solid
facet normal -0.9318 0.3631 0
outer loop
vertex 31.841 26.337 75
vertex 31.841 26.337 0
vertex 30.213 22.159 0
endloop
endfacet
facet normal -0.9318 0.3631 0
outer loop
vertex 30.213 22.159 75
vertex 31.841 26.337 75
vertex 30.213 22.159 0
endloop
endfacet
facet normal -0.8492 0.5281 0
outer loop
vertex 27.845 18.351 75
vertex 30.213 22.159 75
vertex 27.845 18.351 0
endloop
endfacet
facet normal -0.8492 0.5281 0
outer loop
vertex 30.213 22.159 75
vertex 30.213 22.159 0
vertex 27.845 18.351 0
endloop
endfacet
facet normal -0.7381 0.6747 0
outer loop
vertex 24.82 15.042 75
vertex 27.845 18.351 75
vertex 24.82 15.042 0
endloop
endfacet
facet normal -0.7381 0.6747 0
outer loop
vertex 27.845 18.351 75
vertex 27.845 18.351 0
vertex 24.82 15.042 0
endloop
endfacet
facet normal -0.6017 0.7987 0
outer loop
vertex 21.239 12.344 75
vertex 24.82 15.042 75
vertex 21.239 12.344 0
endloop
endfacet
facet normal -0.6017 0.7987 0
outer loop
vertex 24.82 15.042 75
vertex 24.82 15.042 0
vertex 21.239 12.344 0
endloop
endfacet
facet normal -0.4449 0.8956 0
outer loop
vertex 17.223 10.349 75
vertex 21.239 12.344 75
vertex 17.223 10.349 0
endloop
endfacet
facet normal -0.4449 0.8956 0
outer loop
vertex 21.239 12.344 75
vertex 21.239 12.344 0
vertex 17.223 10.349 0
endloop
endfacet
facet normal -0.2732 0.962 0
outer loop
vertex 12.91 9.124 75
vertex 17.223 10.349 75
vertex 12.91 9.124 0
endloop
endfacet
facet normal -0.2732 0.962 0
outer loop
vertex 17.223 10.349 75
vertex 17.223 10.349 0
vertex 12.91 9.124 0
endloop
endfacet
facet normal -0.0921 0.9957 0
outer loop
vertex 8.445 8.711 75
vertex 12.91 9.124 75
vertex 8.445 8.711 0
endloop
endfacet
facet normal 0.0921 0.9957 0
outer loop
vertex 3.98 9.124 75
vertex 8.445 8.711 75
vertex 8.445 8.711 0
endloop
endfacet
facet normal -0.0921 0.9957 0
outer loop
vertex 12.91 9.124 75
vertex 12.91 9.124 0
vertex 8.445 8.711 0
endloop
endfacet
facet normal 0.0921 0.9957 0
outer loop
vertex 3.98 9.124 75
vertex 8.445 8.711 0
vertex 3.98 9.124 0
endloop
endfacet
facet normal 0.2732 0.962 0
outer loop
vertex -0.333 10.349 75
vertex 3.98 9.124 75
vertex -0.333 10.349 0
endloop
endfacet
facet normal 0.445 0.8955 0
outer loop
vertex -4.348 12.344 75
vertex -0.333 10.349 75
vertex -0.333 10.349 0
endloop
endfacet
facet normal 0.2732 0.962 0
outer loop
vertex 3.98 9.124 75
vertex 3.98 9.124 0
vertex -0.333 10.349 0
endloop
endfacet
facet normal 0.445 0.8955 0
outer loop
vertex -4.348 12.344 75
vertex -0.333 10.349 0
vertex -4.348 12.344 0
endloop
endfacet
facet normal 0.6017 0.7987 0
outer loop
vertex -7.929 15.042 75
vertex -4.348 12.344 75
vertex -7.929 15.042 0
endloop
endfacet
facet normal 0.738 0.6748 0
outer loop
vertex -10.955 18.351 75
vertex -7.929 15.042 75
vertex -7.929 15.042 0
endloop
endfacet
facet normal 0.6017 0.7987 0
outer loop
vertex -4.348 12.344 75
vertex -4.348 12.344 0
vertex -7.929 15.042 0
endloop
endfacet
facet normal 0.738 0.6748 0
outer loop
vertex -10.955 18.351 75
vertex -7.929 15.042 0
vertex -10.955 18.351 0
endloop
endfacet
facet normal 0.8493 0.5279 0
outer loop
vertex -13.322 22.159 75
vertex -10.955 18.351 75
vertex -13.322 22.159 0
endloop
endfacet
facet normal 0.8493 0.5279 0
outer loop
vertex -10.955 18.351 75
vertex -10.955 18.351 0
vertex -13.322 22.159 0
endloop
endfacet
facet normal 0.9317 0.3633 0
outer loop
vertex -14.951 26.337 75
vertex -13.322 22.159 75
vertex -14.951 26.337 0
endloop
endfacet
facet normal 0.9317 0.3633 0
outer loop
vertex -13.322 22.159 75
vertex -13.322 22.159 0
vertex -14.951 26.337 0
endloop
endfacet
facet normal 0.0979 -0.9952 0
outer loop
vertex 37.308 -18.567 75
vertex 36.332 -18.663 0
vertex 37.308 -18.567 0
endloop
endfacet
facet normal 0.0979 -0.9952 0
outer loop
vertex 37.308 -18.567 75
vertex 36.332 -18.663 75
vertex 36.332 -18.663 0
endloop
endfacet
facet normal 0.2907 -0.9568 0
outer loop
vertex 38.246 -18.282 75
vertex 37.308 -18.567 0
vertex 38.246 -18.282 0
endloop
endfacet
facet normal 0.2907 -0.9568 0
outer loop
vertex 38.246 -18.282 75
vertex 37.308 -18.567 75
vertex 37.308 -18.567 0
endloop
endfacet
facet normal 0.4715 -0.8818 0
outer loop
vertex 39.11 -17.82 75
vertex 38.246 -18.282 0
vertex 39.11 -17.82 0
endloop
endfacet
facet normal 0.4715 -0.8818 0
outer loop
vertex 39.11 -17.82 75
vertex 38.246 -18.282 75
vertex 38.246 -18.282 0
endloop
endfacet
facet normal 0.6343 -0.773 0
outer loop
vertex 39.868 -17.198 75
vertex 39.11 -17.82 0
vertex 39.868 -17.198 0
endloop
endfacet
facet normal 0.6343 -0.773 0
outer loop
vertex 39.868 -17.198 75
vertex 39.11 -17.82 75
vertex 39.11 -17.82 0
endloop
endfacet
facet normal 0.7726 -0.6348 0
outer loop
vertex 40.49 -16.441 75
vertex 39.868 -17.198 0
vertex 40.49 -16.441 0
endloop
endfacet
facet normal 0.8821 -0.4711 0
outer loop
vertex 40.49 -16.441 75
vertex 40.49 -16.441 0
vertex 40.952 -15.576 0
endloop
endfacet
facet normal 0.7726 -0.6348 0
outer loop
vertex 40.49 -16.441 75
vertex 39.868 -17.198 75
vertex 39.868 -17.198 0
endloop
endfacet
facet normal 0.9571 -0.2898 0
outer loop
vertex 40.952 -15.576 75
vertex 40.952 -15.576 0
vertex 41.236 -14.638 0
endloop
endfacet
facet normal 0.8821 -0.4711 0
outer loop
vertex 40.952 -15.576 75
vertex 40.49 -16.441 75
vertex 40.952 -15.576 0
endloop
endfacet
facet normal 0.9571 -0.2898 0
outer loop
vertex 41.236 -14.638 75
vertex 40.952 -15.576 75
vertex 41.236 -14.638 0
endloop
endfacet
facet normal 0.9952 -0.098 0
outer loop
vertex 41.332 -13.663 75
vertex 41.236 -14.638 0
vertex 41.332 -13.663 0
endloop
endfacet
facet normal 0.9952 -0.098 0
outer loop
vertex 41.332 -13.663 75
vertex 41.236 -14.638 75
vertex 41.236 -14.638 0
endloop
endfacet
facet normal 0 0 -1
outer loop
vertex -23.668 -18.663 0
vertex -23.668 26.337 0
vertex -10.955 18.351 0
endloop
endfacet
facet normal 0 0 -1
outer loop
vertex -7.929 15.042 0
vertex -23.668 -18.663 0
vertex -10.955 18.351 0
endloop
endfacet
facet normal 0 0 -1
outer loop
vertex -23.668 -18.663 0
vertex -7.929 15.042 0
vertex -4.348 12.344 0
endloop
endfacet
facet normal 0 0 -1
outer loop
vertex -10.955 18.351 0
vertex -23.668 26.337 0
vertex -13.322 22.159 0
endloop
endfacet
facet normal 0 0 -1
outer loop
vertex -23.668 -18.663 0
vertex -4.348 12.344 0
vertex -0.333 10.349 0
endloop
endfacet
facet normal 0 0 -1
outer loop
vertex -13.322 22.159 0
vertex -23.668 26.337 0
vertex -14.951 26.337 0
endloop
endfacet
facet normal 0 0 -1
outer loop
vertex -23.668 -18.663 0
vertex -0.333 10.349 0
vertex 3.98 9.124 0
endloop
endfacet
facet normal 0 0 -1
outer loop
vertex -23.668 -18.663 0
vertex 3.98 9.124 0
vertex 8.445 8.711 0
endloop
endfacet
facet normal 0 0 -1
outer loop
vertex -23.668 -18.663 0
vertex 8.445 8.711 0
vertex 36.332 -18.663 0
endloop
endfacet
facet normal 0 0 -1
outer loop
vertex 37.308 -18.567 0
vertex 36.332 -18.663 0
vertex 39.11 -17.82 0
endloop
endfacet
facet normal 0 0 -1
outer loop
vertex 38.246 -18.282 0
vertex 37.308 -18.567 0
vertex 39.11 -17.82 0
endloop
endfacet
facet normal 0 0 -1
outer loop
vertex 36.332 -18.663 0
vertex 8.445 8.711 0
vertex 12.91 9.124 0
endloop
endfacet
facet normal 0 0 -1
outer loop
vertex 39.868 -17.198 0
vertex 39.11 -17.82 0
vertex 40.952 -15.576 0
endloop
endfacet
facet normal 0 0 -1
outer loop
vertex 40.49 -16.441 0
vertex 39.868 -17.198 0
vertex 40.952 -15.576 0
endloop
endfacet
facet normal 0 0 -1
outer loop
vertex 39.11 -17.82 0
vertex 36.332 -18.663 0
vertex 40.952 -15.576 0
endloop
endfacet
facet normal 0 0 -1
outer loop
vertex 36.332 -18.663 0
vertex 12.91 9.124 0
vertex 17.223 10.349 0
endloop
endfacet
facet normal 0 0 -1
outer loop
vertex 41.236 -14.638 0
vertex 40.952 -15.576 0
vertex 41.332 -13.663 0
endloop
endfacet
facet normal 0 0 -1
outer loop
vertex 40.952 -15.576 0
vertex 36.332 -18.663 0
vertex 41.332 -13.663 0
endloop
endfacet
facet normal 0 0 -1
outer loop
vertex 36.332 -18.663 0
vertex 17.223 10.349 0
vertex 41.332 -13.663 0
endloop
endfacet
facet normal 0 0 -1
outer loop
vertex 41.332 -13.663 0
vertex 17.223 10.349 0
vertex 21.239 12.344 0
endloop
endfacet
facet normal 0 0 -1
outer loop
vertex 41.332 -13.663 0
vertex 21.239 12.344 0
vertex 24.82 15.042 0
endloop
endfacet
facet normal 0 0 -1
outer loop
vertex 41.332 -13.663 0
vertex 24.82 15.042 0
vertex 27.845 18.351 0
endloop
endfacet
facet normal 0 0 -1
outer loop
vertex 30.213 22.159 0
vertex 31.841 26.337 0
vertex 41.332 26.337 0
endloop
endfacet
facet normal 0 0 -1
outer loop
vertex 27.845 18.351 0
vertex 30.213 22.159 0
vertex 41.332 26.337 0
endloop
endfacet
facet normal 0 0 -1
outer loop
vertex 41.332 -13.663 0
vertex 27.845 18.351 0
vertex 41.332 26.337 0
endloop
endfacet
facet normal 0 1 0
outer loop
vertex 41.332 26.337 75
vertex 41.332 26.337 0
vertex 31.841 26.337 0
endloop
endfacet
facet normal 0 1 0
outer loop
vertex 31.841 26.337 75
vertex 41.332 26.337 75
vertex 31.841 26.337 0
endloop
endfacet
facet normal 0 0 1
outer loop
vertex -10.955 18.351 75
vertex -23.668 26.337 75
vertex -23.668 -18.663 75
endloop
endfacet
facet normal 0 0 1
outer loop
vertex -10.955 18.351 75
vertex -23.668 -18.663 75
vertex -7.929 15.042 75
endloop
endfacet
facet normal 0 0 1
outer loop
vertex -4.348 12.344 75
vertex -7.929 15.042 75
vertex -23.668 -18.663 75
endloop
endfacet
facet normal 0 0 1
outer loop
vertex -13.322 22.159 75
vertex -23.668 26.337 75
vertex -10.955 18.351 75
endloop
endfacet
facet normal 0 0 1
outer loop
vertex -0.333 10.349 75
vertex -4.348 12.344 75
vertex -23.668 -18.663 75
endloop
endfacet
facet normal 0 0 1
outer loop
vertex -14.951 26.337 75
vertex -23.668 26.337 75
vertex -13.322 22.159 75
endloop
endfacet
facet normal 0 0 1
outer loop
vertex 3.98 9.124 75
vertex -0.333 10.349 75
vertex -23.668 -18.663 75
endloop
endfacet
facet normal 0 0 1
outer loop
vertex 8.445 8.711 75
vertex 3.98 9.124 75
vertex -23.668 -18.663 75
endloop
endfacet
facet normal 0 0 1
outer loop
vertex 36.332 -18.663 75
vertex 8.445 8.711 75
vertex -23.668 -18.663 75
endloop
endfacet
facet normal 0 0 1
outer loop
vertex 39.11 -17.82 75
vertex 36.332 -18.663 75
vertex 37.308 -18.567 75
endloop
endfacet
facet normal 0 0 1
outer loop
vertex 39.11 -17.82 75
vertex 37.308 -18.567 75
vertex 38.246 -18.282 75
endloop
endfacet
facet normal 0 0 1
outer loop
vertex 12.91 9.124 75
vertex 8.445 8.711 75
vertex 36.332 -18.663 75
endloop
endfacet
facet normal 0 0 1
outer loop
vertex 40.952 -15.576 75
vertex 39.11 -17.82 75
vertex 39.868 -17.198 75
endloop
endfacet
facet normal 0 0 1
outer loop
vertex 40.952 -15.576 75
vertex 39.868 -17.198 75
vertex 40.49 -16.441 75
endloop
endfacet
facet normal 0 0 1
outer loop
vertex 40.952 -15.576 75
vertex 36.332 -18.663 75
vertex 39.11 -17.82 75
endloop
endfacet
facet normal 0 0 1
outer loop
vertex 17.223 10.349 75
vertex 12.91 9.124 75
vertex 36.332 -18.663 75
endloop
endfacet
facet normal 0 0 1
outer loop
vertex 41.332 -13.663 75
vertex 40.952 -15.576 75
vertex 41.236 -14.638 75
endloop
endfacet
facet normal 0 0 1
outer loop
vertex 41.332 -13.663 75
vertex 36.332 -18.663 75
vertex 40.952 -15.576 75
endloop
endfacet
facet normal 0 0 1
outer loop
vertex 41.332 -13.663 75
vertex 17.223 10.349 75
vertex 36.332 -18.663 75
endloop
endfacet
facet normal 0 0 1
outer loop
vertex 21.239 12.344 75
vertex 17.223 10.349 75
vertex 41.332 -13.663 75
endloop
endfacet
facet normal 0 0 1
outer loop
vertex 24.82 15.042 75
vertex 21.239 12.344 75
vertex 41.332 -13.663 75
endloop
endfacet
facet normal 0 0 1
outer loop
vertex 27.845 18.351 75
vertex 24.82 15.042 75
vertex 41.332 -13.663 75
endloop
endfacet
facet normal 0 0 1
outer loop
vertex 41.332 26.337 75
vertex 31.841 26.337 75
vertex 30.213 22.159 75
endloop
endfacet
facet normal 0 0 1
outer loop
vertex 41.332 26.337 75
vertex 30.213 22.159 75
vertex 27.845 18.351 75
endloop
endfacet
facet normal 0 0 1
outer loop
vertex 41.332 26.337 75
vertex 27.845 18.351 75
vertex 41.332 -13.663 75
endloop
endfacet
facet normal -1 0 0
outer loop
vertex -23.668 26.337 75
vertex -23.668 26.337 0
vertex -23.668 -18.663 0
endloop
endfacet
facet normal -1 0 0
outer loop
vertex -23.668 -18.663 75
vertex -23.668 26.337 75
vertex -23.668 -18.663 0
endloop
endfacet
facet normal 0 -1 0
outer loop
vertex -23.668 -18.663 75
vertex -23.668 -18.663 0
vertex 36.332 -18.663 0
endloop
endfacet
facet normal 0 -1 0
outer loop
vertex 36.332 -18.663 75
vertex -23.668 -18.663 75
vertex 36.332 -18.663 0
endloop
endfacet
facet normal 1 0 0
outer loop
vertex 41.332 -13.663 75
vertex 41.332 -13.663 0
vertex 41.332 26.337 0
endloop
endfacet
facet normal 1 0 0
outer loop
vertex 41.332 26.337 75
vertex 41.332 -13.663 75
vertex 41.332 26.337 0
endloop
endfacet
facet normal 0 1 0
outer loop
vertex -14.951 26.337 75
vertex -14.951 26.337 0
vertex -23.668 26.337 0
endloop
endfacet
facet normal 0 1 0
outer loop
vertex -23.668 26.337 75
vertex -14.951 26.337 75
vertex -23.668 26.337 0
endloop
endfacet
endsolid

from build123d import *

# Parameters (mm, degrees)
F1_DEPTH = 75
F2_R     = 5


with BuildPart() as f1:
    # F0 (on Top) → F1 (new body)
    with BuildSketch(Plane.XY):
        with BuildLine():
            Line((-23.66752, 26.337069), (-23.66752, -18.662931))
            Line((-23.66752, -18.662931), (41.33248, -18.662931))
            Line((41.33248, -18.662931), (41.33248, 26.337069))
            Line((41.33248, 26.337069), (31.841161, 26.337069))
            ThreePointArc((31.841161, 26.337069), (8.445234, 8.710863), (-14.950693, 26.337069))
            Line((-14.950693, 26.337069), (-23.66752, 26.337069))
        make_face()
    extrude(amount=F1_DEPTH)

    # F2
    f2_edges = [f1.edges().sort_by_distance(p)[0] for p in [
        (41.33248, -18.662931, 37.5),
    ]]
    fillet(f2_edges, radius=F2_R)


solid = f1.part
